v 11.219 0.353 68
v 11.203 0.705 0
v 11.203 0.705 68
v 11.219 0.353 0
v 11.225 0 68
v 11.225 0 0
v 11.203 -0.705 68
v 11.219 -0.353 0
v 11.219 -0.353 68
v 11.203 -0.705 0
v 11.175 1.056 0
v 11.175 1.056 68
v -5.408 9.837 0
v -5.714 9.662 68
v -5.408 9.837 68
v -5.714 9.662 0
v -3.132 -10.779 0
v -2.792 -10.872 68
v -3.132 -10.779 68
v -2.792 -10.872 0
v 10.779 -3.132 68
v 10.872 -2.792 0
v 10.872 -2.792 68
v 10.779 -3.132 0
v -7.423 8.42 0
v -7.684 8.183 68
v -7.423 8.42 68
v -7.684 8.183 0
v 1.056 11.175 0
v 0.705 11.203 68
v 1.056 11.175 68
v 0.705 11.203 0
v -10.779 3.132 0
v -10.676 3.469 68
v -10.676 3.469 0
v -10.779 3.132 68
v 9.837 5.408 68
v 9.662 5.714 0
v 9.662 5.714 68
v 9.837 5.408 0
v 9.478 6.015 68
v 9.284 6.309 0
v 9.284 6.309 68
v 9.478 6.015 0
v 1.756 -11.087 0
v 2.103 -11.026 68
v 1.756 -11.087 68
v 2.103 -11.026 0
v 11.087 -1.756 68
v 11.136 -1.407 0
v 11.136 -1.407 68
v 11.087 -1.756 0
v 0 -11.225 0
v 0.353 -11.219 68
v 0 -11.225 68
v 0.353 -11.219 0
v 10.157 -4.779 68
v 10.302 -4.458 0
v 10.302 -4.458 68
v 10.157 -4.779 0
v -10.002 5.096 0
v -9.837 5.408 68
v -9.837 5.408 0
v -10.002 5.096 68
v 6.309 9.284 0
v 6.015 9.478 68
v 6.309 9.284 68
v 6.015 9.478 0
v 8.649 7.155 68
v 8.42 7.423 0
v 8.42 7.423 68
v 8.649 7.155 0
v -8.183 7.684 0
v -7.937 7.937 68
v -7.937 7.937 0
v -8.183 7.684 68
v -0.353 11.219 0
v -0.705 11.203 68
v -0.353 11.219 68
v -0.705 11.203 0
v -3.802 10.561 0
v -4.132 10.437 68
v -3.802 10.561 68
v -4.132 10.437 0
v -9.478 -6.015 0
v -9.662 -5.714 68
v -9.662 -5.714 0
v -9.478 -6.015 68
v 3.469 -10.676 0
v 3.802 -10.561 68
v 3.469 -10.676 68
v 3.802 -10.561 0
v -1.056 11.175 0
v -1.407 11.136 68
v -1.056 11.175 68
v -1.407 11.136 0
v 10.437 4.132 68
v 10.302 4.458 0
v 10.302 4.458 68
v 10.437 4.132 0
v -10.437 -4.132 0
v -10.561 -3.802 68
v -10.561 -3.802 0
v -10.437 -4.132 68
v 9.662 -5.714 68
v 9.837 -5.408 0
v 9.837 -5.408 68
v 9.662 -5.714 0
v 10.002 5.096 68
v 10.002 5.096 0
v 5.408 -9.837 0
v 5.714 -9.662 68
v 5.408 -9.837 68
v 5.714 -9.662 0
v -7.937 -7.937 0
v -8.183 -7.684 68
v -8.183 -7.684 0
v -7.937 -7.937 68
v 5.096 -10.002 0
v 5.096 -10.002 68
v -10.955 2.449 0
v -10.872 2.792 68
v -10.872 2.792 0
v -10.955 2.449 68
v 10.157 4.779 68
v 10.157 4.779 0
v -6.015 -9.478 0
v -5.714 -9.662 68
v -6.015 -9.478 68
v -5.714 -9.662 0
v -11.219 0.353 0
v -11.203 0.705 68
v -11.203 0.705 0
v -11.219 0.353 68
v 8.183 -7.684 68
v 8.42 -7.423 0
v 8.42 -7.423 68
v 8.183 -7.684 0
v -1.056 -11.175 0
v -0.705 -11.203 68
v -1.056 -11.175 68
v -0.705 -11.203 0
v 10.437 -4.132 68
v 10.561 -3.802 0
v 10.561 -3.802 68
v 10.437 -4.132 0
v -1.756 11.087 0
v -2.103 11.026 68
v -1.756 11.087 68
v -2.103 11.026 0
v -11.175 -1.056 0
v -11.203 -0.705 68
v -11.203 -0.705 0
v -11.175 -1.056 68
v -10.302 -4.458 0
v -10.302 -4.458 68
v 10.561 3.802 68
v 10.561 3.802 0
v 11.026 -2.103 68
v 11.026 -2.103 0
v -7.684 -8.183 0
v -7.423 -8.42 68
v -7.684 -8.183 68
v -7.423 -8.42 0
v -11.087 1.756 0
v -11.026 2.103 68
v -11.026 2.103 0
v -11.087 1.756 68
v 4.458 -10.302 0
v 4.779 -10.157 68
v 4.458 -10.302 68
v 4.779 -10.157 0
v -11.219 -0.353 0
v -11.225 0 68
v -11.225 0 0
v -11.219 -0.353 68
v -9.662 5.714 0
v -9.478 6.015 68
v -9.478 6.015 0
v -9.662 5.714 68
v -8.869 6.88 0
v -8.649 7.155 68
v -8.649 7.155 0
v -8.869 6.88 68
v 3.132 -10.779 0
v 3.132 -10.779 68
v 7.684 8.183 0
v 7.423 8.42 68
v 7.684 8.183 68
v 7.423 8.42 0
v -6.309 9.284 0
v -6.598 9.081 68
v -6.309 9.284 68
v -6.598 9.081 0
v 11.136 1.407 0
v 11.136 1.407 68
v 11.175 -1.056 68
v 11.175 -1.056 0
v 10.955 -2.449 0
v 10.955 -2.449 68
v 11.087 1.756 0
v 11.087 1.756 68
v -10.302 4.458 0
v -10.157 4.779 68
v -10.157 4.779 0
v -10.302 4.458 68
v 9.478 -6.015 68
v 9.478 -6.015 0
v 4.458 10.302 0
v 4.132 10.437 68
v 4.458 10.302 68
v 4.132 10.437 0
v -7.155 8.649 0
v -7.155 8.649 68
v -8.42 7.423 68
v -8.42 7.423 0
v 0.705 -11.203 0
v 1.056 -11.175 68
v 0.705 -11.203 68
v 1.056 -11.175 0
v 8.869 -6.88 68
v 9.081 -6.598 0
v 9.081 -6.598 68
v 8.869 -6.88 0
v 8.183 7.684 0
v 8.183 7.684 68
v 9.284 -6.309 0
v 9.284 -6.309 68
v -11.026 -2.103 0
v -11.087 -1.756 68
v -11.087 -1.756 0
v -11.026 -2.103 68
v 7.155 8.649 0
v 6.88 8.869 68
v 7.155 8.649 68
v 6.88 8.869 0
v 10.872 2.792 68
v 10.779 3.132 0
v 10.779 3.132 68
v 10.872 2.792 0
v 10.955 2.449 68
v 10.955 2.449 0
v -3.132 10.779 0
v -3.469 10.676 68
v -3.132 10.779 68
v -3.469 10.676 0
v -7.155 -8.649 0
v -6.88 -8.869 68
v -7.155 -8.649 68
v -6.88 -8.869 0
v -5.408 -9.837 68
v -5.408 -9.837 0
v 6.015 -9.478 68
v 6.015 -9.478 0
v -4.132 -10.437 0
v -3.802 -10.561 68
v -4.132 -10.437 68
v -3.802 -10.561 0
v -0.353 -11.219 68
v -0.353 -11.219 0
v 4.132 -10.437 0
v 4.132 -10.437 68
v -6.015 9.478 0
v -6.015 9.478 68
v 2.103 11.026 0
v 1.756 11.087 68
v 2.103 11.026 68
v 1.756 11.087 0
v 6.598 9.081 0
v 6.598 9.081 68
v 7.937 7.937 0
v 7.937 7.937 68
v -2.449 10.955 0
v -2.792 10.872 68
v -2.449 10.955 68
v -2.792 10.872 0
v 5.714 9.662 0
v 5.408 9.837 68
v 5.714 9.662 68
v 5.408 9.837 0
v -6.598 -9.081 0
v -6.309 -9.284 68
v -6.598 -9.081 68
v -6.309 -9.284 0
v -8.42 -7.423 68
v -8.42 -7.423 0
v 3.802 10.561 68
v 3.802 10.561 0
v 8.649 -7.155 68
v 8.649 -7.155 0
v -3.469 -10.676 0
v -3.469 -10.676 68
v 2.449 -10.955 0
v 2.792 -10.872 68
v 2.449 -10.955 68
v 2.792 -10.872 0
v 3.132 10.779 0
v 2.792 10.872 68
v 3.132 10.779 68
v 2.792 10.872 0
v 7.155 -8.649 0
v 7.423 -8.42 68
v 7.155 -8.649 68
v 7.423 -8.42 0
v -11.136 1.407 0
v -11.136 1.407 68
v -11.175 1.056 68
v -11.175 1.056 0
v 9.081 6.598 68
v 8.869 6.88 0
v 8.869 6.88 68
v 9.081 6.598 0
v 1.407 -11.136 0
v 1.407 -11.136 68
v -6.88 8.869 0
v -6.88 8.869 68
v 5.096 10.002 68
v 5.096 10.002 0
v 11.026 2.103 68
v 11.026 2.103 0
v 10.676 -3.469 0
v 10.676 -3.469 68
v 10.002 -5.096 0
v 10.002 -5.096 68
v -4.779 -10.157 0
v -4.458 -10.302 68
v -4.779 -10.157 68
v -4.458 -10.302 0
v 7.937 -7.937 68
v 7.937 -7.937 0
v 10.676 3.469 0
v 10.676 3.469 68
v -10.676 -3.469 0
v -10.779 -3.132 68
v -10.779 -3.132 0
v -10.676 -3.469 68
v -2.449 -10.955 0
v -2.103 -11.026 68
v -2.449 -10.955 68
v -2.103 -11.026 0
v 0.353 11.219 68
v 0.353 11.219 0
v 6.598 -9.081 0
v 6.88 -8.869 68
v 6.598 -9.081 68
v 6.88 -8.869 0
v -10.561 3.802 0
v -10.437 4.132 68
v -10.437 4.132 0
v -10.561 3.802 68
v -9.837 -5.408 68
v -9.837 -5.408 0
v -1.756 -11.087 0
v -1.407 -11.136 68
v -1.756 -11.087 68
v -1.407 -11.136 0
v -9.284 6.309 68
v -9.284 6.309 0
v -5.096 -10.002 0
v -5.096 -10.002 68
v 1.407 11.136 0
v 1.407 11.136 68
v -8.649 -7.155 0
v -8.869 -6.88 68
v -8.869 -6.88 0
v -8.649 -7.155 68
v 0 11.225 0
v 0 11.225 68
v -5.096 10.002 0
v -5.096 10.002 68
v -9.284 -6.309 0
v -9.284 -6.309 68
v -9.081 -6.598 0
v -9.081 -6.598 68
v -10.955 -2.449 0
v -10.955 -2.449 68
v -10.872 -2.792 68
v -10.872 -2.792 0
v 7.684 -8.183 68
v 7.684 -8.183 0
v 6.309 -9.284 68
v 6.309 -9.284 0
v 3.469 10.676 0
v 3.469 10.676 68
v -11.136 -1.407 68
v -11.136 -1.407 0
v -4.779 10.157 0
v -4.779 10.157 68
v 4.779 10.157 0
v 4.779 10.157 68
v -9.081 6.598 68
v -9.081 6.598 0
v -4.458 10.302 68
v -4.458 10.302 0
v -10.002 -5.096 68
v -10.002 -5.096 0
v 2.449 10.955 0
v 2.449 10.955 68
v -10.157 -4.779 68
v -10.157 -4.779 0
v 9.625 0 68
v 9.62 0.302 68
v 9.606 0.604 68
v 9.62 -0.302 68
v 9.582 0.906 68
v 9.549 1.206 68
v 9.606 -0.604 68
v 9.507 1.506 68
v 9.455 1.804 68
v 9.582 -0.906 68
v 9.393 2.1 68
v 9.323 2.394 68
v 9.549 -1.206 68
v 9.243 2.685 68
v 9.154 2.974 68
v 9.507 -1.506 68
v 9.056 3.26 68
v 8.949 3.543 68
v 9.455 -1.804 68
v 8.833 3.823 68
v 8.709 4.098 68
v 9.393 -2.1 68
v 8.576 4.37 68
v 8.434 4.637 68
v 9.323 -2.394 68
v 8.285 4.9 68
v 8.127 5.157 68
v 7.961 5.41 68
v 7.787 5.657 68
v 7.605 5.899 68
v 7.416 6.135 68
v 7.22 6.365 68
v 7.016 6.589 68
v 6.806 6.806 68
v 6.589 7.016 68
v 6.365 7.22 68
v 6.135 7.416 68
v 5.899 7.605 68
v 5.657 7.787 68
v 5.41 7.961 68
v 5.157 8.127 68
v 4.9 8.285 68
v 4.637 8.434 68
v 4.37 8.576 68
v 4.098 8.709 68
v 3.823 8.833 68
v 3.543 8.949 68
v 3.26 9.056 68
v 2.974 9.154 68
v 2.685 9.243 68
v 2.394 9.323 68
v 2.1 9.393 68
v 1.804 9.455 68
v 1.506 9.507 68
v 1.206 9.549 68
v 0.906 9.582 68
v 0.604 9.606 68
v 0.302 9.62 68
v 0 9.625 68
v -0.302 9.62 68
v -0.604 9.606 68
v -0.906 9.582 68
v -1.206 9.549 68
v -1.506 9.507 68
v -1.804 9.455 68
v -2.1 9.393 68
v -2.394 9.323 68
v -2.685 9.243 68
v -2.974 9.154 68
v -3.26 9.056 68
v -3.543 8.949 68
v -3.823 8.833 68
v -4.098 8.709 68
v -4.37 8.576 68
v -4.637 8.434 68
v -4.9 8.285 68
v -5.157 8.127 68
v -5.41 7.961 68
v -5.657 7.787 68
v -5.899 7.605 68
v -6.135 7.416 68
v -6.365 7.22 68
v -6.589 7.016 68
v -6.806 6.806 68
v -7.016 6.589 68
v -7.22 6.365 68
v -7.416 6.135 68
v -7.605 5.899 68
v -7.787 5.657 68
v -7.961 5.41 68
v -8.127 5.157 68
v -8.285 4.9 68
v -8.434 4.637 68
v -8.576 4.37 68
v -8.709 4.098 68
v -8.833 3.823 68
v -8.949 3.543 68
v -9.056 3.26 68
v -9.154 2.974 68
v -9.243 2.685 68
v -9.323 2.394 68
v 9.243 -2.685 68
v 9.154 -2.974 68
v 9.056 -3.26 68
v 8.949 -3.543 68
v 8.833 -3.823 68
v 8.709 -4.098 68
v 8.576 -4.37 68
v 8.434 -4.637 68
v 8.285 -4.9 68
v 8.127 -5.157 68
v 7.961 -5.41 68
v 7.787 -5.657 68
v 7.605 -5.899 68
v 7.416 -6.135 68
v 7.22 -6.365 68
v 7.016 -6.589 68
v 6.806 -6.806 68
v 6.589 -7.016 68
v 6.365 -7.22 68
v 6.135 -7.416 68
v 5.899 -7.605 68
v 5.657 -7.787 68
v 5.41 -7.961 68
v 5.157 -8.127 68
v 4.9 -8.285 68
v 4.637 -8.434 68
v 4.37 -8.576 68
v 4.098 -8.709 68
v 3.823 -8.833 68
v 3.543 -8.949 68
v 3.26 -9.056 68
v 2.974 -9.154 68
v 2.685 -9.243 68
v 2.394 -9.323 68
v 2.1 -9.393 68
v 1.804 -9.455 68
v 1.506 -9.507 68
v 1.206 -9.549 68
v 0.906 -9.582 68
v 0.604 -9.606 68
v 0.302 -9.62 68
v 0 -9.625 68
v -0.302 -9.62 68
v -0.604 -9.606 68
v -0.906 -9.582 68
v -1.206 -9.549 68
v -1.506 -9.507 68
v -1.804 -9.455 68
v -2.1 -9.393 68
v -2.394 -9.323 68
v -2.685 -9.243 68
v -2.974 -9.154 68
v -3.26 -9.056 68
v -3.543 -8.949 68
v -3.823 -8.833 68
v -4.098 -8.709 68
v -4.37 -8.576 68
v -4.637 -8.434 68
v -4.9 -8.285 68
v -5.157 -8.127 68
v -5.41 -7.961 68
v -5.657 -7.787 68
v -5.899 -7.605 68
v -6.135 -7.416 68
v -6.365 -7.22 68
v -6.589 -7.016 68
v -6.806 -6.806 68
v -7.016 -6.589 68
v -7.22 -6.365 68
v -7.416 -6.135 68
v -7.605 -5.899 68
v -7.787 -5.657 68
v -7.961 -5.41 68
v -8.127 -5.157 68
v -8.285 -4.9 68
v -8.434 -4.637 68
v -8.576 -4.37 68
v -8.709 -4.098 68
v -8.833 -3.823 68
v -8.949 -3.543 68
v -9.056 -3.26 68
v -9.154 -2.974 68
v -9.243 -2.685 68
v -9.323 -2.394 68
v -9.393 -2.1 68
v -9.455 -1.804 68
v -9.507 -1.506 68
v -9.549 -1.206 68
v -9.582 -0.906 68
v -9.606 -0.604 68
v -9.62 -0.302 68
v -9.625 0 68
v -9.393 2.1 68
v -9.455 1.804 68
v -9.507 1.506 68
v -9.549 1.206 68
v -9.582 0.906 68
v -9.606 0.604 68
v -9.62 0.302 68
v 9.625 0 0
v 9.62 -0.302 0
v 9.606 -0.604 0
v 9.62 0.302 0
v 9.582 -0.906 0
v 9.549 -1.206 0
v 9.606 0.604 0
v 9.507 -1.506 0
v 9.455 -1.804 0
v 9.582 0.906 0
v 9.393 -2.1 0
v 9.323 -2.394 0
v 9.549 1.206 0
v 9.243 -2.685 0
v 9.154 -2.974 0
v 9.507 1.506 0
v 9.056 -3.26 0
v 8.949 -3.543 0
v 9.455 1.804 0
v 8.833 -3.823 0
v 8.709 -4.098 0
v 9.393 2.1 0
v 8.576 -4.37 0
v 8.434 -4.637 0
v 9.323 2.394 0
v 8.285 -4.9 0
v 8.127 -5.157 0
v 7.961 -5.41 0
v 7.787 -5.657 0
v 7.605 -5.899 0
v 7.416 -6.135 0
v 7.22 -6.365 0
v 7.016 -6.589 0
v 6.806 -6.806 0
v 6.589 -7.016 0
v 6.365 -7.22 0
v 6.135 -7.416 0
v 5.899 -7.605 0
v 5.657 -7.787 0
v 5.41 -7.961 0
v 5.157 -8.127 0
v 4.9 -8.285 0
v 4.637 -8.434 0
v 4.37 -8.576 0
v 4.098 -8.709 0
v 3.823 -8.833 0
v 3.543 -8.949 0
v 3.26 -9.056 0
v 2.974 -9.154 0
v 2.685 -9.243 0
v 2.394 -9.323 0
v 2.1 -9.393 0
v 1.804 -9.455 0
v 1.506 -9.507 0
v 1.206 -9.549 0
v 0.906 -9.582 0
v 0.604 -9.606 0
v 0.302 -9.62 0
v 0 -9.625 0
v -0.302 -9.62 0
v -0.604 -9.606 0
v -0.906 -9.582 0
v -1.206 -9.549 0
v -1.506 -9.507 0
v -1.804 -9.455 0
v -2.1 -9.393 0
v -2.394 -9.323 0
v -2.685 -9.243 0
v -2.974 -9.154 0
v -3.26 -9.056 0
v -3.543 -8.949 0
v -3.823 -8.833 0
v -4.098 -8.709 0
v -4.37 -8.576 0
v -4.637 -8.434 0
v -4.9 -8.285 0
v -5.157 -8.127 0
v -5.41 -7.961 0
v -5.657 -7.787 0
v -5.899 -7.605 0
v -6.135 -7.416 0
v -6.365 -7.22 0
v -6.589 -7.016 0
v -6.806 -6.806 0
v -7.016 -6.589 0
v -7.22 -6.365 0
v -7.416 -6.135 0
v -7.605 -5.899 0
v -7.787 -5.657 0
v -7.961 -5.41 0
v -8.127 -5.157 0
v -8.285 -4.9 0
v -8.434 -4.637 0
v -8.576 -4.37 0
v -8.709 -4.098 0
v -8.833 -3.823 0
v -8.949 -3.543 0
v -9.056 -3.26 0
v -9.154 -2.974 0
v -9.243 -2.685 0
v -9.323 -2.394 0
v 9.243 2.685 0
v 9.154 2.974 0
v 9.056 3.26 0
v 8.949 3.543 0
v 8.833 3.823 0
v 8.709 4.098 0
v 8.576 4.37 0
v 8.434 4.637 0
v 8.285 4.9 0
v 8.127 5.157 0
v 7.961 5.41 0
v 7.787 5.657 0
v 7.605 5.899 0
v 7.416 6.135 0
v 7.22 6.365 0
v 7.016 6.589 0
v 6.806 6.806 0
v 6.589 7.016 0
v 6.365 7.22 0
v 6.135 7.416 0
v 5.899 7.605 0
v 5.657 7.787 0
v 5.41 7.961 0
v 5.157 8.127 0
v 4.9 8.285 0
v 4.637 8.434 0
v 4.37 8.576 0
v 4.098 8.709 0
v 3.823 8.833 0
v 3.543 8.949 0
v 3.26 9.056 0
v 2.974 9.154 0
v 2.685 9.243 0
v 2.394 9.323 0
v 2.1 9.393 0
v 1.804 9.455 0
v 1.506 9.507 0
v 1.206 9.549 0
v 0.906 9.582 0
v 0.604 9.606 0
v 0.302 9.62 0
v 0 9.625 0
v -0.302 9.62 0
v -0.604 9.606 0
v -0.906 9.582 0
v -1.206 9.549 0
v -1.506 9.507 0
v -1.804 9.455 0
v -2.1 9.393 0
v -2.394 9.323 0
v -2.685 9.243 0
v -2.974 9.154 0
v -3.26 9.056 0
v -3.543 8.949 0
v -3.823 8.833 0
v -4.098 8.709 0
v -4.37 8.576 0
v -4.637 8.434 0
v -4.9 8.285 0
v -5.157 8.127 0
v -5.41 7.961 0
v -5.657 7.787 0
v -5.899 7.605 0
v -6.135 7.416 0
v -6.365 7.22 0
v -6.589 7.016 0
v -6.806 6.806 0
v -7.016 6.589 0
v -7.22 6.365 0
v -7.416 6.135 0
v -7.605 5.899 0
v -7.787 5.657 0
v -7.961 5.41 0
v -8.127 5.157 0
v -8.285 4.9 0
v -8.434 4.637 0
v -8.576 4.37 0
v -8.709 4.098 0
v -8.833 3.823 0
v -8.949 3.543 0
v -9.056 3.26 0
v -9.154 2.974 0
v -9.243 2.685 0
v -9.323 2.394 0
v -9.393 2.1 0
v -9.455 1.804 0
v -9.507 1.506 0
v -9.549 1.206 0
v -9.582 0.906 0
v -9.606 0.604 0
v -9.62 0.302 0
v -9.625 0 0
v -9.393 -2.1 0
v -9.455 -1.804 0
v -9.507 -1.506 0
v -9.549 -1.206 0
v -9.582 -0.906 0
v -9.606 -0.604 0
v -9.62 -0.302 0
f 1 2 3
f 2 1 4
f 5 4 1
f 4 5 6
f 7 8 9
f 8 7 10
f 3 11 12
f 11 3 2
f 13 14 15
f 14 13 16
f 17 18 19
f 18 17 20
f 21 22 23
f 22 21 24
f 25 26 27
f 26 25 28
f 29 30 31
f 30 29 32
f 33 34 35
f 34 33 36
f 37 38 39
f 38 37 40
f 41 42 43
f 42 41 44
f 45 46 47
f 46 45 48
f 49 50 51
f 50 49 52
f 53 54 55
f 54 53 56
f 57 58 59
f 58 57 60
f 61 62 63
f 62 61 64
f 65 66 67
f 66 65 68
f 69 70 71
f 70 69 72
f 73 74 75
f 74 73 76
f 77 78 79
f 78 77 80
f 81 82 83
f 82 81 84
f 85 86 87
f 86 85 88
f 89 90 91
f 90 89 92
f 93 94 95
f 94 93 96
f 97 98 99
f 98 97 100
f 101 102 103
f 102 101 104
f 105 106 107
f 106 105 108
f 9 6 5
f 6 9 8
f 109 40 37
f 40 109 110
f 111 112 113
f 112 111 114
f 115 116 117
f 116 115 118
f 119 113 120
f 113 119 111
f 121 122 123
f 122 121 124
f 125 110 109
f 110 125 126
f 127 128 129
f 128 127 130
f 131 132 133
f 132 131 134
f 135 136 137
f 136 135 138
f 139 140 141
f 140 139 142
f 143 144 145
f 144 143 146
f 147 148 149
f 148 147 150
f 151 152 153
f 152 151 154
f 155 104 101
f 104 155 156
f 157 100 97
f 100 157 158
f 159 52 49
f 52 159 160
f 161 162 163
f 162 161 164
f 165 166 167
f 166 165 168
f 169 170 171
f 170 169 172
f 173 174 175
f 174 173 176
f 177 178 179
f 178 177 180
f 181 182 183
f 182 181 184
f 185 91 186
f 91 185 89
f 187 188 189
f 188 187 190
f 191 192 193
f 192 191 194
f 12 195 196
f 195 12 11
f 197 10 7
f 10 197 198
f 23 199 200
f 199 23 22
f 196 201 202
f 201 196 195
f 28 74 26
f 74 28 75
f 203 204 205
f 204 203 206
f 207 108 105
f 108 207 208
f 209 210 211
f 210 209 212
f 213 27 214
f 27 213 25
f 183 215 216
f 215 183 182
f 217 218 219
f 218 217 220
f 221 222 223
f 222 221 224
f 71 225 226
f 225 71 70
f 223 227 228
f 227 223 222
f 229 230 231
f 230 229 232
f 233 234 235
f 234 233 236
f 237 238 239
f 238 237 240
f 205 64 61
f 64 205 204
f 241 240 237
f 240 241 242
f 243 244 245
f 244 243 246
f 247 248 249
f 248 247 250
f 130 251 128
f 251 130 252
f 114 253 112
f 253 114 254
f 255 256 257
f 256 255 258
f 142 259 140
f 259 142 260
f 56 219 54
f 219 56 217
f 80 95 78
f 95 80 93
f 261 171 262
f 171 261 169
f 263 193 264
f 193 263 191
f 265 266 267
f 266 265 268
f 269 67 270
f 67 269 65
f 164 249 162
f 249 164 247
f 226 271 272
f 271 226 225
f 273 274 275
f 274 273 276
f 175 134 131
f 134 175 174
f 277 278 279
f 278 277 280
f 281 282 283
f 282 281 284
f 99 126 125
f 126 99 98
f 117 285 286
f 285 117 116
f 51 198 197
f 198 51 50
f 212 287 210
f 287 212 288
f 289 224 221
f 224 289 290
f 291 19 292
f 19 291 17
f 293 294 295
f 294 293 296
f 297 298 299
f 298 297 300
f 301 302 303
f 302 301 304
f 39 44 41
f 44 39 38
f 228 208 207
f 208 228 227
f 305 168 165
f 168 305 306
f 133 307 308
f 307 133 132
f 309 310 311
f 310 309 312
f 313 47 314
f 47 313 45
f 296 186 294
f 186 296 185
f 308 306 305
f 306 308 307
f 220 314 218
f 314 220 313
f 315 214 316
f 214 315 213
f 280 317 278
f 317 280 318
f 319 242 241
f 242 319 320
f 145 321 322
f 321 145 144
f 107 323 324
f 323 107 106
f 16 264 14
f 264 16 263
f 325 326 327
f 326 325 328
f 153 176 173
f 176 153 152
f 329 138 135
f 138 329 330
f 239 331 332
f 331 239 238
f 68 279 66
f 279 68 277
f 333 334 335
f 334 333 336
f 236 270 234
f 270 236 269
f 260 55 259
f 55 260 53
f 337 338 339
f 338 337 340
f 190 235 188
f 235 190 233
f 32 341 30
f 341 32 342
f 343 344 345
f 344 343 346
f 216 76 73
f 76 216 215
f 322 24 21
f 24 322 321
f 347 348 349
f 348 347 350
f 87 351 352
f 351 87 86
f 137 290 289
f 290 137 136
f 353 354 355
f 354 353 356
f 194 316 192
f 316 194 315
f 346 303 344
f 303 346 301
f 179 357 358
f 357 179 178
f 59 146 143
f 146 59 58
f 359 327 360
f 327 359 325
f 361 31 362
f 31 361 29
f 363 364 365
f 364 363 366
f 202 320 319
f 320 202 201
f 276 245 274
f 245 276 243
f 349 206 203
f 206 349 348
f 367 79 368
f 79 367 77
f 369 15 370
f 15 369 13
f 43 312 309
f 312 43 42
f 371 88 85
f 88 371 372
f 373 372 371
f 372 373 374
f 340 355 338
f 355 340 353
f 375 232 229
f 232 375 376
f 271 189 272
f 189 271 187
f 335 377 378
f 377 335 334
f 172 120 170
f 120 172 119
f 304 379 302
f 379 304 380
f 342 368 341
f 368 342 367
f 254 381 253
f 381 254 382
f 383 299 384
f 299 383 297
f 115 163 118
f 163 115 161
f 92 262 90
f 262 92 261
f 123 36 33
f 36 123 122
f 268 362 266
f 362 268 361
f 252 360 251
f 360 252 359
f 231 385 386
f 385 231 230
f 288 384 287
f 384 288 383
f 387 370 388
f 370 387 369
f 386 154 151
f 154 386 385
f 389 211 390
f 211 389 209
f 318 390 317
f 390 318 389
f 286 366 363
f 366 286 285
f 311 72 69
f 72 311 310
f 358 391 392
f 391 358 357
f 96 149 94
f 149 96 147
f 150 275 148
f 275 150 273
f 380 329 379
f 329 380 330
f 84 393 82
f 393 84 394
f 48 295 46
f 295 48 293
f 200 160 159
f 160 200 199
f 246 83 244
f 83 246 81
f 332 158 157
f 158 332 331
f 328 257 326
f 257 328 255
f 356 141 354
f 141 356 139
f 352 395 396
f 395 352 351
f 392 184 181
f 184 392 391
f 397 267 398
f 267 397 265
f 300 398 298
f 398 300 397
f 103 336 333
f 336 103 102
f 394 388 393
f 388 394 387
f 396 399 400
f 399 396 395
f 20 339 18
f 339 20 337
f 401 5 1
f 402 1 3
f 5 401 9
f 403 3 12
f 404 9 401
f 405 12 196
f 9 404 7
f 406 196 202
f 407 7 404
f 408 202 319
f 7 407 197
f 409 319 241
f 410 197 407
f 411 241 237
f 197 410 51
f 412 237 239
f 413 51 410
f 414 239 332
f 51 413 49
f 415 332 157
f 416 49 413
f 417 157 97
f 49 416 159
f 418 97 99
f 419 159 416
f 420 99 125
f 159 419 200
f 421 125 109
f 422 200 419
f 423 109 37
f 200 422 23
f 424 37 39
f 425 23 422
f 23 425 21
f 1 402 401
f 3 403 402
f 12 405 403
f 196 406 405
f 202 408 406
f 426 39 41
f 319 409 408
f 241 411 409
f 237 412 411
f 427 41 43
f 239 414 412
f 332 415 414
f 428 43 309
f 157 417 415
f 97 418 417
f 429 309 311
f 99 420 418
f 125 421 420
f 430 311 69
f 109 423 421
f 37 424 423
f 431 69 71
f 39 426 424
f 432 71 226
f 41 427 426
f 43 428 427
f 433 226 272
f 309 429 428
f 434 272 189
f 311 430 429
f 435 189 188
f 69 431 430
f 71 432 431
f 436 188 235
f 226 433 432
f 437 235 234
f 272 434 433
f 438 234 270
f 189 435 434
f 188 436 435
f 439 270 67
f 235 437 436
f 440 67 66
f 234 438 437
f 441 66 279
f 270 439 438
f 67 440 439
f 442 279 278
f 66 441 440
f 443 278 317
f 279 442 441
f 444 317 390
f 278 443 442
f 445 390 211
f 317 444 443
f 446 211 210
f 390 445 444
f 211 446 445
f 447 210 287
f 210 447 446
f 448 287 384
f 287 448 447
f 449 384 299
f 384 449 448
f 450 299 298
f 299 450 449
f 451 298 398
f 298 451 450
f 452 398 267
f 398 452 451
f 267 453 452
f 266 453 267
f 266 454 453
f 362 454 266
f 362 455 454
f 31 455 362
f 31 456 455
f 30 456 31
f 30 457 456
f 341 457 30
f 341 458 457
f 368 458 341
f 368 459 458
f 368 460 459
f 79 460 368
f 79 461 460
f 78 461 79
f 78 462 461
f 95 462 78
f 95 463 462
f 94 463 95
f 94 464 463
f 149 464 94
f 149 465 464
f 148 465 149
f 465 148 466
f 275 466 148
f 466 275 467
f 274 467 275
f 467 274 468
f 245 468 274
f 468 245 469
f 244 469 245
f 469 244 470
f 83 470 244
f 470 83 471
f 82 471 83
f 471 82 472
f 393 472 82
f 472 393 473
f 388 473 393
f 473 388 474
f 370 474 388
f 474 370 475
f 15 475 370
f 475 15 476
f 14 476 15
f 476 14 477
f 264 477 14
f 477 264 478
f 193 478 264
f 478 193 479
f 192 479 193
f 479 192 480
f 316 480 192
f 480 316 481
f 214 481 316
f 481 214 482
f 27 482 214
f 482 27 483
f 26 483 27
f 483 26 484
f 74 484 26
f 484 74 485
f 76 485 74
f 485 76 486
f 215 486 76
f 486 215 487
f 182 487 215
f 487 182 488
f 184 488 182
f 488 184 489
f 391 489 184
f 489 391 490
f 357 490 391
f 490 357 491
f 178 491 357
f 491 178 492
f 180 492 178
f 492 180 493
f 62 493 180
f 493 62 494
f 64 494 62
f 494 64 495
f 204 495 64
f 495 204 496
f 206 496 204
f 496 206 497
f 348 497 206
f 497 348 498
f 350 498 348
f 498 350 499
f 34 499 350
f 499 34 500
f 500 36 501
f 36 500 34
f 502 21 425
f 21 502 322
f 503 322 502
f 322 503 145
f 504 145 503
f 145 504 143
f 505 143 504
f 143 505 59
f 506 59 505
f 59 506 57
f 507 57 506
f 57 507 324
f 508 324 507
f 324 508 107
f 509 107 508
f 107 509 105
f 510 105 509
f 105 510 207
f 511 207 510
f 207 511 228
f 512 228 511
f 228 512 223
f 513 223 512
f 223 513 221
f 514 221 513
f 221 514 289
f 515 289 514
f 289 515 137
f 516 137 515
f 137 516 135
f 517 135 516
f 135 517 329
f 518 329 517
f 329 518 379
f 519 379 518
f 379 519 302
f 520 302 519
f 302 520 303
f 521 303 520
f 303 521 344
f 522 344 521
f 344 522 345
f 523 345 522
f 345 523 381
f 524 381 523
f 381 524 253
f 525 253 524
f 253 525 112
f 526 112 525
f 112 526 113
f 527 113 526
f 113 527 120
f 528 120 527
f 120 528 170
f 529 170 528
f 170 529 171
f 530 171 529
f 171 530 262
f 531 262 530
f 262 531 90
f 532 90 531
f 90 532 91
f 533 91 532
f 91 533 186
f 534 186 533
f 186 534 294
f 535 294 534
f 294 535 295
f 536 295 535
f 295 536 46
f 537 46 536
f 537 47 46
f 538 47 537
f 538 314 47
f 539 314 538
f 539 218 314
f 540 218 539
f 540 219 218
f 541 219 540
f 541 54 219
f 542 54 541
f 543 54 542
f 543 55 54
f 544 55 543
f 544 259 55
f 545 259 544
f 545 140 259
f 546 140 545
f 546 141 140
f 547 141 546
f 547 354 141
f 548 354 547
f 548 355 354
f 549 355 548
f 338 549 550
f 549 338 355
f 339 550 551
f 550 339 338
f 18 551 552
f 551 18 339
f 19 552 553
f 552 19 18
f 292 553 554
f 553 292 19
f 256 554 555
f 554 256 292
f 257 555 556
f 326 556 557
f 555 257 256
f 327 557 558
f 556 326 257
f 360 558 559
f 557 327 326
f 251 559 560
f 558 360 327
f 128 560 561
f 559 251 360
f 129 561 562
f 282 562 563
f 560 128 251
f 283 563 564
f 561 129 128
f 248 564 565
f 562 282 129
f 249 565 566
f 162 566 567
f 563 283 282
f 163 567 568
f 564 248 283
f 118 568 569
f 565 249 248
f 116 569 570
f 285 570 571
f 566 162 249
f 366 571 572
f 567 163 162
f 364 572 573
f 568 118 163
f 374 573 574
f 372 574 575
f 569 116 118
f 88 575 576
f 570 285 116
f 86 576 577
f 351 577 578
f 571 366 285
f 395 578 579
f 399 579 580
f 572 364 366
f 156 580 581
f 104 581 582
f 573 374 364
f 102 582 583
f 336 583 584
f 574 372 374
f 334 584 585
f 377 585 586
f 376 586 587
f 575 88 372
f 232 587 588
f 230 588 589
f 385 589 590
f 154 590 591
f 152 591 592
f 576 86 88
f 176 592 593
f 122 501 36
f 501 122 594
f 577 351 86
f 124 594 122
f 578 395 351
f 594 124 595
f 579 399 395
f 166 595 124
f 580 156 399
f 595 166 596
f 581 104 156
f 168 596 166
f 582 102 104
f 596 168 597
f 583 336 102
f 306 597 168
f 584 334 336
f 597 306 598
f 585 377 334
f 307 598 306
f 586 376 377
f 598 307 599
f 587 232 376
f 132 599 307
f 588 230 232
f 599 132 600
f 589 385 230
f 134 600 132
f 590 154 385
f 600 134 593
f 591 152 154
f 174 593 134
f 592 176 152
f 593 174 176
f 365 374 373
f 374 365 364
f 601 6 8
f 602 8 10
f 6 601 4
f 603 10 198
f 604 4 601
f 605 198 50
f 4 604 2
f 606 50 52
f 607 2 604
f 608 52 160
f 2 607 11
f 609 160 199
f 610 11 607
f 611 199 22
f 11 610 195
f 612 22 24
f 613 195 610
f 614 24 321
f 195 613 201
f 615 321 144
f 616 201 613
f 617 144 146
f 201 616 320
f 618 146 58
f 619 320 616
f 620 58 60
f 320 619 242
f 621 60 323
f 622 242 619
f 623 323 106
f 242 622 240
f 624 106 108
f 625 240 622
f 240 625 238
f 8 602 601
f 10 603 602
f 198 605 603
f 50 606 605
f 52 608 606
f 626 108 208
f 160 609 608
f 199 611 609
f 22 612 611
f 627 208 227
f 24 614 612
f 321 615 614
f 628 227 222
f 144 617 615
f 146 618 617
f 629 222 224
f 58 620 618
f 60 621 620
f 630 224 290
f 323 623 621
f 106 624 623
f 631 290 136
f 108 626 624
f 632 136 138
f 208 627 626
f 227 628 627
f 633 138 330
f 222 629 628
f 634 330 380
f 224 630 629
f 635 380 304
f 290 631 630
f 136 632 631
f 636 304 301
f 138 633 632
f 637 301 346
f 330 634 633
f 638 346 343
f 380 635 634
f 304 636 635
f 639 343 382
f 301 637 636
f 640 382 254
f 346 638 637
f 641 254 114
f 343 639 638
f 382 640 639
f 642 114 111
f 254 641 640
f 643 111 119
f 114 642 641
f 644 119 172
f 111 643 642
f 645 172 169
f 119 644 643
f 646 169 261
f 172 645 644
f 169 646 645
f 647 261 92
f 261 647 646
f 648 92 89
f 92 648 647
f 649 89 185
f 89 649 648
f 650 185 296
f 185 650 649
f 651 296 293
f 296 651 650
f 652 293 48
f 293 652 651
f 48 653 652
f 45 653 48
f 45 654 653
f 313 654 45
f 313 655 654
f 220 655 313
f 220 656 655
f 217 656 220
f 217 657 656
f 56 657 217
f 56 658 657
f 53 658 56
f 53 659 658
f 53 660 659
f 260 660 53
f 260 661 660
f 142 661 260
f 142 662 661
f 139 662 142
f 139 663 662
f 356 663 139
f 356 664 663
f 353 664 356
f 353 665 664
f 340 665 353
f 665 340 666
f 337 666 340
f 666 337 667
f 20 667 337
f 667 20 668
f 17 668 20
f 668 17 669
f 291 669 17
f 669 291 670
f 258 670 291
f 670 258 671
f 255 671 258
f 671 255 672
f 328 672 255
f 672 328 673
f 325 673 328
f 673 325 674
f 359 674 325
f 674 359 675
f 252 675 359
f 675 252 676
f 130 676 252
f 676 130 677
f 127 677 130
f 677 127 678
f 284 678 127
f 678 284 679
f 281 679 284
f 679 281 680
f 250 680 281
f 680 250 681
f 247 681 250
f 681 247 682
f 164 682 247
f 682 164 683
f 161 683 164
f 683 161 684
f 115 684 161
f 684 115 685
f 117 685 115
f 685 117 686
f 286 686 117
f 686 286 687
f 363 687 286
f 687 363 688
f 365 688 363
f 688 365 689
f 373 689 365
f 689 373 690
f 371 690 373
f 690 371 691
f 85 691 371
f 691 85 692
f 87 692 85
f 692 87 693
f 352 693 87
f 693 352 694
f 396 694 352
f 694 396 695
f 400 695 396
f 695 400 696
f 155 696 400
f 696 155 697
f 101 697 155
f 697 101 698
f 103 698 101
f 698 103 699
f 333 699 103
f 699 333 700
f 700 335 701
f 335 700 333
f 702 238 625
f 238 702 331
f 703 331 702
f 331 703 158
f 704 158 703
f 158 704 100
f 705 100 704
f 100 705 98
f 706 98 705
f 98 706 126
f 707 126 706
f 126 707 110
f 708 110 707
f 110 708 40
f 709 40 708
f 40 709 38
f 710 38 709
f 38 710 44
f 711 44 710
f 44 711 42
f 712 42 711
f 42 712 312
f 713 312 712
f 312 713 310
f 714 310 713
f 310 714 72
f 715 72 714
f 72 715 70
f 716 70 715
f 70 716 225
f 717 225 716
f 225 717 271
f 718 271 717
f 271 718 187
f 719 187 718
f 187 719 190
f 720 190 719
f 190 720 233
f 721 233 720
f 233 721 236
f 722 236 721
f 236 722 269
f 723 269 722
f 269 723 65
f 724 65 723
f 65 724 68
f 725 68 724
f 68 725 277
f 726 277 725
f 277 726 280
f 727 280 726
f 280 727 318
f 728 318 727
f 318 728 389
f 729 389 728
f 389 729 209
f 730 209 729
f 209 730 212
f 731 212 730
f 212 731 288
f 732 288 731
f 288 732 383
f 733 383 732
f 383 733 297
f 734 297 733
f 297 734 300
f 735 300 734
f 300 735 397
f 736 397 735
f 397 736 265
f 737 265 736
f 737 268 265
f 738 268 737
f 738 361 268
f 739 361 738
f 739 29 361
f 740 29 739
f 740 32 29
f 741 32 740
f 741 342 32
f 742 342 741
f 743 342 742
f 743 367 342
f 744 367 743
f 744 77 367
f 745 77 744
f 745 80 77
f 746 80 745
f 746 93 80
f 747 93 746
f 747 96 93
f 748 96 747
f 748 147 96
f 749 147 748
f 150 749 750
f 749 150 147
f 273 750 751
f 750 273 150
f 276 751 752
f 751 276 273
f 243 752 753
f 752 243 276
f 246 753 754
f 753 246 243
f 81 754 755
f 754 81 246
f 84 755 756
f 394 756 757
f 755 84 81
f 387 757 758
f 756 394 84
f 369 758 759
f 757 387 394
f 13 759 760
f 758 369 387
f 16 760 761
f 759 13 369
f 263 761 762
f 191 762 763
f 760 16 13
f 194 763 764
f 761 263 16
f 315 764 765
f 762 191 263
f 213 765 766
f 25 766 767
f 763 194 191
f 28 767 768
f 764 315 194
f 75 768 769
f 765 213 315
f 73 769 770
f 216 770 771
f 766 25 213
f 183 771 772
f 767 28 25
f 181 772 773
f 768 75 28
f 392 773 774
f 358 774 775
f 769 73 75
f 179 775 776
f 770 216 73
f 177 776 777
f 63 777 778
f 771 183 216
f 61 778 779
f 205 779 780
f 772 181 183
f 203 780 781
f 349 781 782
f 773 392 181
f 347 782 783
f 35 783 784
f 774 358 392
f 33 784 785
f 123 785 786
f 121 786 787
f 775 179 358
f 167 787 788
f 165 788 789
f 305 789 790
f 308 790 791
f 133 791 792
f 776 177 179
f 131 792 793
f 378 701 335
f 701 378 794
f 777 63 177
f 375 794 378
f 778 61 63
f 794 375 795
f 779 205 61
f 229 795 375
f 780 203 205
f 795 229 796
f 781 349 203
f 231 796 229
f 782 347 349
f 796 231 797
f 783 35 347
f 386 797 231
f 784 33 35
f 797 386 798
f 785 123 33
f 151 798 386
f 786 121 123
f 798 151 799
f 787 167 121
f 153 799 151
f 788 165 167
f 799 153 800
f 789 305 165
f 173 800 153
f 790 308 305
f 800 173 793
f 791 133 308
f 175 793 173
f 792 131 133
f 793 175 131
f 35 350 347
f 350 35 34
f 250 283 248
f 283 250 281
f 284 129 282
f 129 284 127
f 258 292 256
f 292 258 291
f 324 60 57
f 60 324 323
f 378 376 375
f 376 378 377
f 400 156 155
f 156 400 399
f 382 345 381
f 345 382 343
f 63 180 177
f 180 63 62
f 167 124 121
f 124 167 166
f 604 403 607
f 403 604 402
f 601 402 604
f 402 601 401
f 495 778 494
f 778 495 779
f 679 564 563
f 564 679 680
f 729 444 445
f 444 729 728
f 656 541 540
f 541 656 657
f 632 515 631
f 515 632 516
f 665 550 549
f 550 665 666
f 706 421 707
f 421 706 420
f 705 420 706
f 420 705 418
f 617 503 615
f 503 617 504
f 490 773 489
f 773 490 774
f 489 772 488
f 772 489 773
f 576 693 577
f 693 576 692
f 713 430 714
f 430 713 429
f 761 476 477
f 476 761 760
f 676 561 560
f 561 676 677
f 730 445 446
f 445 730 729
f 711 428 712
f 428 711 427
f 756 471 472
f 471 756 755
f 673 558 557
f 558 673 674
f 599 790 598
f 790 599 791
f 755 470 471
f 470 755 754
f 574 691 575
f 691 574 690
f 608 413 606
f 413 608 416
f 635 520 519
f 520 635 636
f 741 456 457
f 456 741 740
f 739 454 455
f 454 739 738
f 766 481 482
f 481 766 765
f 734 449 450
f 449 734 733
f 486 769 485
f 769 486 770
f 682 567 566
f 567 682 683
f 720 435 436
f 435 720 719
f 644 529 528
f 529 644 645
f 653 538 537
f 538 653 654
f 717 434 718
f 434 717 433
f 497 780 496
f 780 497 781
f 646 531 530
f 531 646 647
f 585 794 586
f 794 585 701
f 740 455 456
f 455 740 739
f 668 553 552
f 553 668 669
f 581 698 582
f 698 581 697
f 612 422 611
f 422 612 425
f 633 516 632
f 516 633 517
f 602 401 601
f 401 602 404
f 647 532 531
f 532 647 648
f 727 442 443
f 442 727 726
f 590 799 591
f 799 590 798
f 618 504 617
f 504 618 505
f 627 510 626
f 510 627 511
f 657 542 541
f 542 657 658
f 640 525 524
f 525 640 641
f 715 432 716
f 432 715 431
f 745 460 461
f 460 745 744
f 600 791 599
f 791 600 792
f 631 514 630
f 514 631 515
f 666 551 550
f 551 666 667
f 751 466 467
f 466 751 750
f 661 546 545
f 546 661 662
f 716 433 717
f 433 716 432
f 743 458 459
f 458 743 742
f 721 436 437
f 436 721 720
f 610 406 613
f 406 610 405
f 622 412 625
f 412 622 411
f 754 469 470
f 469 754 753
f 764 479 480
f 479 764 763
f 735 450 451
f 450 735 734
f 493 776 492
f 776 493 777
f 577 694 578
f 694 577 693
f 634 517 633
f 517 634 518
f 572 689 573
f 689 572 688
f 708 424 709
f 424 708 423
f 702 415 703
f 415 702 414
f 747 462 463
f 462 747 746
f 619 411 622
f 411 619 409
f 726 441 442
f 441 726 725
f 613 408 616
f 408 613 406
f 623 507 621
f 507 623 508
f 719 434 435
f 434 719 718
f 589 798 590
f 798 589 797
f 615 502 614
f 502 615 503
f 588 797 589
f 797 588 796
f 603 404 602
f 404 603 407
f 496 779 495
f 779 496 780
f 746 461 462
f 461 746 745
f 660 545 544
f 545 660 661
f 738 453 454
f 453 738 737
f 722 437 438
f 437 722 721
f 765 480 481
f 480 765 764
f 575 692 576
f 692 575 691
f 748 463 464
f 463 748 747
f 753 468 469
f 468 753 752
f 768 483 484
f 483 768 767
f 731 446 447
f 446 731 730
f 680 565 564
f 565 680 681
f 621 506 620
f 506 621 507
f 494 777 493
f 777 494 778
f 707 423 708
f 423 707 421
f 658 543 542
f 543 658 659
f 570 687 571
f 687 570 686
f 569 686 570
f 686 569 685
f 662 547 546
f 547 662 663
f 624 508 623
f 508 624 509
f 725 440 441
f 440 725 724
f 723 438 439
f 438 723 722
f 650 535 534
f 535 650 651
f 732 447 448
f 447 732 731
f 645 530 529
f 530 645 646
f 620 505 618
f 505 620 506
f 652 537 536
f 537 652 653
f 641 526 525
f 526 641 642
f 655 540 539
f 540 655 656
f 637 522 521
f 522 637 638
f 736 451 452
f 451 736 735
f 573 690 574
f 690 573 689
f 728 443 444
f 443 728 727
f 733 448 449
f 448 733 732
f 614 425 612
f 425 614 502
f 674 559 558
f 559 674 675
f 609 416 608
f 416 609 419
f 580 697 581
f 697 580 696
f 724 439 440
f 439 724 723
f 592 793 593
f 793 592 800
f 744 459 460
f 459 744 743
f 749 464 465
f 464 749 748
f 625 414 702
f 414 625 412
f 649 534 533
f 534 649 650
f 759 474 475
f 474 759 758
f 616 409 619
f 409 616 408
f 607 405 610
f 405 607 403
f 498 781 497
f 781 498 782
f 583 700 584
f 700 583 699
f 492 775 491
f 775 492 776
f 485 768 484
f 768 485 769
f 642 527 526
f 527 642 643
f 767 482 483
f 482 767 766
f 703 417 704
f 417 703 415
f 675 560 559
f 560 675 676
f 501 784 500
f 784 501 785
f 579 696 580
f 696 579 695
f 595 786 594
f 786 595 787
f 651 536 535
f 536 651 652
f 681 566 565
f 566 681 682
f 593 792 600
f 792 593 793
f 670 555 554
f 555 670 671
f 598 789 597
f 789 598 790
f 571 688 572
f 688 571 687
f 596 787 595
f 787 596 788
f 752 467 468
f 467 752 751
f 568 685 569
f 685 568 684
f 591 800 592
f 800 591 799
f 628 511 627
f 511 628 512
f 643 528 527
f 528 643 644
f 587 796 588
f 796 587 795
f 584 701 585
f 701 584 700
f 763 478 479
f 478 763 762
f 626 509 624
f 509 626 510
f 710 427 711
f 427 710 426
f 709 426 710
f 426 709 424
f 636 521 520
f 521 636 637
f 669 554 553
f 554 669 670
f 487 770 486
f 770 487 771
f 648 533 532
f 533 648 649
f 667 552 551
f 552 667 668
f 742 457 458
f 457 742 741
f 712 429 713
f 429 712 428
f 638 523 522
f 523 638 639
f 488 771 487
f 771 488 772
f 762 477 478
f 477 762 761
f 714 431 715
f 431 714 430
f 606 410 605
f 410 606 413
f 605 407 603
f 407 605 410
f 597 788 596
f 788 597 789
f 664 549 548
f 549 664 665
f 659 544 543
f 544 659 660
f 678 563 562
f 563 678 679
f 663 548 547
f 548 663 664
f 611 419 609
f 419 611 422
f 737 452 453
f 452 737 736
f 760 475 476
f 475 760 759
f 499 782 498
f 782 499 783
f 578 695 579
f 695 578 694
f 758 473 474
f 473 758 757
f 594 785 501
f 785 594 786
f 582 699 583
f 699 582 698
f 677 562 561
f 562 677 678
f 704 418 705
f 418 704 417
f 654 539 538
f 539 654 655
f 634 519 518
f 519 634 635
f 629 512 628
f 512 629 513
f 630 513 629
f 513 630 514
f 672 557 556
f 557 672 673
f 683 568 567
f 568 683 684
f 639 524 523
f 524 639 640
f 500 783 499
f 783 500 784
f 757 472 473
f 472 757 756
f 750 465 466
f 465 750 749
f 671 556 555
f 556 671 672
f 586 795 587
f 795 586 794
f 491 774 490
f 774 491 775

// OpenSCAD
$fn=200;

d1=19+0.25;
w = 1.6;
d2=d1+2*w;
h=68;

difference() {
  cylinder(d=d2, h=h);
  translate([0, 0, -1]) cylinder(d=d1, h=h+2);
}
